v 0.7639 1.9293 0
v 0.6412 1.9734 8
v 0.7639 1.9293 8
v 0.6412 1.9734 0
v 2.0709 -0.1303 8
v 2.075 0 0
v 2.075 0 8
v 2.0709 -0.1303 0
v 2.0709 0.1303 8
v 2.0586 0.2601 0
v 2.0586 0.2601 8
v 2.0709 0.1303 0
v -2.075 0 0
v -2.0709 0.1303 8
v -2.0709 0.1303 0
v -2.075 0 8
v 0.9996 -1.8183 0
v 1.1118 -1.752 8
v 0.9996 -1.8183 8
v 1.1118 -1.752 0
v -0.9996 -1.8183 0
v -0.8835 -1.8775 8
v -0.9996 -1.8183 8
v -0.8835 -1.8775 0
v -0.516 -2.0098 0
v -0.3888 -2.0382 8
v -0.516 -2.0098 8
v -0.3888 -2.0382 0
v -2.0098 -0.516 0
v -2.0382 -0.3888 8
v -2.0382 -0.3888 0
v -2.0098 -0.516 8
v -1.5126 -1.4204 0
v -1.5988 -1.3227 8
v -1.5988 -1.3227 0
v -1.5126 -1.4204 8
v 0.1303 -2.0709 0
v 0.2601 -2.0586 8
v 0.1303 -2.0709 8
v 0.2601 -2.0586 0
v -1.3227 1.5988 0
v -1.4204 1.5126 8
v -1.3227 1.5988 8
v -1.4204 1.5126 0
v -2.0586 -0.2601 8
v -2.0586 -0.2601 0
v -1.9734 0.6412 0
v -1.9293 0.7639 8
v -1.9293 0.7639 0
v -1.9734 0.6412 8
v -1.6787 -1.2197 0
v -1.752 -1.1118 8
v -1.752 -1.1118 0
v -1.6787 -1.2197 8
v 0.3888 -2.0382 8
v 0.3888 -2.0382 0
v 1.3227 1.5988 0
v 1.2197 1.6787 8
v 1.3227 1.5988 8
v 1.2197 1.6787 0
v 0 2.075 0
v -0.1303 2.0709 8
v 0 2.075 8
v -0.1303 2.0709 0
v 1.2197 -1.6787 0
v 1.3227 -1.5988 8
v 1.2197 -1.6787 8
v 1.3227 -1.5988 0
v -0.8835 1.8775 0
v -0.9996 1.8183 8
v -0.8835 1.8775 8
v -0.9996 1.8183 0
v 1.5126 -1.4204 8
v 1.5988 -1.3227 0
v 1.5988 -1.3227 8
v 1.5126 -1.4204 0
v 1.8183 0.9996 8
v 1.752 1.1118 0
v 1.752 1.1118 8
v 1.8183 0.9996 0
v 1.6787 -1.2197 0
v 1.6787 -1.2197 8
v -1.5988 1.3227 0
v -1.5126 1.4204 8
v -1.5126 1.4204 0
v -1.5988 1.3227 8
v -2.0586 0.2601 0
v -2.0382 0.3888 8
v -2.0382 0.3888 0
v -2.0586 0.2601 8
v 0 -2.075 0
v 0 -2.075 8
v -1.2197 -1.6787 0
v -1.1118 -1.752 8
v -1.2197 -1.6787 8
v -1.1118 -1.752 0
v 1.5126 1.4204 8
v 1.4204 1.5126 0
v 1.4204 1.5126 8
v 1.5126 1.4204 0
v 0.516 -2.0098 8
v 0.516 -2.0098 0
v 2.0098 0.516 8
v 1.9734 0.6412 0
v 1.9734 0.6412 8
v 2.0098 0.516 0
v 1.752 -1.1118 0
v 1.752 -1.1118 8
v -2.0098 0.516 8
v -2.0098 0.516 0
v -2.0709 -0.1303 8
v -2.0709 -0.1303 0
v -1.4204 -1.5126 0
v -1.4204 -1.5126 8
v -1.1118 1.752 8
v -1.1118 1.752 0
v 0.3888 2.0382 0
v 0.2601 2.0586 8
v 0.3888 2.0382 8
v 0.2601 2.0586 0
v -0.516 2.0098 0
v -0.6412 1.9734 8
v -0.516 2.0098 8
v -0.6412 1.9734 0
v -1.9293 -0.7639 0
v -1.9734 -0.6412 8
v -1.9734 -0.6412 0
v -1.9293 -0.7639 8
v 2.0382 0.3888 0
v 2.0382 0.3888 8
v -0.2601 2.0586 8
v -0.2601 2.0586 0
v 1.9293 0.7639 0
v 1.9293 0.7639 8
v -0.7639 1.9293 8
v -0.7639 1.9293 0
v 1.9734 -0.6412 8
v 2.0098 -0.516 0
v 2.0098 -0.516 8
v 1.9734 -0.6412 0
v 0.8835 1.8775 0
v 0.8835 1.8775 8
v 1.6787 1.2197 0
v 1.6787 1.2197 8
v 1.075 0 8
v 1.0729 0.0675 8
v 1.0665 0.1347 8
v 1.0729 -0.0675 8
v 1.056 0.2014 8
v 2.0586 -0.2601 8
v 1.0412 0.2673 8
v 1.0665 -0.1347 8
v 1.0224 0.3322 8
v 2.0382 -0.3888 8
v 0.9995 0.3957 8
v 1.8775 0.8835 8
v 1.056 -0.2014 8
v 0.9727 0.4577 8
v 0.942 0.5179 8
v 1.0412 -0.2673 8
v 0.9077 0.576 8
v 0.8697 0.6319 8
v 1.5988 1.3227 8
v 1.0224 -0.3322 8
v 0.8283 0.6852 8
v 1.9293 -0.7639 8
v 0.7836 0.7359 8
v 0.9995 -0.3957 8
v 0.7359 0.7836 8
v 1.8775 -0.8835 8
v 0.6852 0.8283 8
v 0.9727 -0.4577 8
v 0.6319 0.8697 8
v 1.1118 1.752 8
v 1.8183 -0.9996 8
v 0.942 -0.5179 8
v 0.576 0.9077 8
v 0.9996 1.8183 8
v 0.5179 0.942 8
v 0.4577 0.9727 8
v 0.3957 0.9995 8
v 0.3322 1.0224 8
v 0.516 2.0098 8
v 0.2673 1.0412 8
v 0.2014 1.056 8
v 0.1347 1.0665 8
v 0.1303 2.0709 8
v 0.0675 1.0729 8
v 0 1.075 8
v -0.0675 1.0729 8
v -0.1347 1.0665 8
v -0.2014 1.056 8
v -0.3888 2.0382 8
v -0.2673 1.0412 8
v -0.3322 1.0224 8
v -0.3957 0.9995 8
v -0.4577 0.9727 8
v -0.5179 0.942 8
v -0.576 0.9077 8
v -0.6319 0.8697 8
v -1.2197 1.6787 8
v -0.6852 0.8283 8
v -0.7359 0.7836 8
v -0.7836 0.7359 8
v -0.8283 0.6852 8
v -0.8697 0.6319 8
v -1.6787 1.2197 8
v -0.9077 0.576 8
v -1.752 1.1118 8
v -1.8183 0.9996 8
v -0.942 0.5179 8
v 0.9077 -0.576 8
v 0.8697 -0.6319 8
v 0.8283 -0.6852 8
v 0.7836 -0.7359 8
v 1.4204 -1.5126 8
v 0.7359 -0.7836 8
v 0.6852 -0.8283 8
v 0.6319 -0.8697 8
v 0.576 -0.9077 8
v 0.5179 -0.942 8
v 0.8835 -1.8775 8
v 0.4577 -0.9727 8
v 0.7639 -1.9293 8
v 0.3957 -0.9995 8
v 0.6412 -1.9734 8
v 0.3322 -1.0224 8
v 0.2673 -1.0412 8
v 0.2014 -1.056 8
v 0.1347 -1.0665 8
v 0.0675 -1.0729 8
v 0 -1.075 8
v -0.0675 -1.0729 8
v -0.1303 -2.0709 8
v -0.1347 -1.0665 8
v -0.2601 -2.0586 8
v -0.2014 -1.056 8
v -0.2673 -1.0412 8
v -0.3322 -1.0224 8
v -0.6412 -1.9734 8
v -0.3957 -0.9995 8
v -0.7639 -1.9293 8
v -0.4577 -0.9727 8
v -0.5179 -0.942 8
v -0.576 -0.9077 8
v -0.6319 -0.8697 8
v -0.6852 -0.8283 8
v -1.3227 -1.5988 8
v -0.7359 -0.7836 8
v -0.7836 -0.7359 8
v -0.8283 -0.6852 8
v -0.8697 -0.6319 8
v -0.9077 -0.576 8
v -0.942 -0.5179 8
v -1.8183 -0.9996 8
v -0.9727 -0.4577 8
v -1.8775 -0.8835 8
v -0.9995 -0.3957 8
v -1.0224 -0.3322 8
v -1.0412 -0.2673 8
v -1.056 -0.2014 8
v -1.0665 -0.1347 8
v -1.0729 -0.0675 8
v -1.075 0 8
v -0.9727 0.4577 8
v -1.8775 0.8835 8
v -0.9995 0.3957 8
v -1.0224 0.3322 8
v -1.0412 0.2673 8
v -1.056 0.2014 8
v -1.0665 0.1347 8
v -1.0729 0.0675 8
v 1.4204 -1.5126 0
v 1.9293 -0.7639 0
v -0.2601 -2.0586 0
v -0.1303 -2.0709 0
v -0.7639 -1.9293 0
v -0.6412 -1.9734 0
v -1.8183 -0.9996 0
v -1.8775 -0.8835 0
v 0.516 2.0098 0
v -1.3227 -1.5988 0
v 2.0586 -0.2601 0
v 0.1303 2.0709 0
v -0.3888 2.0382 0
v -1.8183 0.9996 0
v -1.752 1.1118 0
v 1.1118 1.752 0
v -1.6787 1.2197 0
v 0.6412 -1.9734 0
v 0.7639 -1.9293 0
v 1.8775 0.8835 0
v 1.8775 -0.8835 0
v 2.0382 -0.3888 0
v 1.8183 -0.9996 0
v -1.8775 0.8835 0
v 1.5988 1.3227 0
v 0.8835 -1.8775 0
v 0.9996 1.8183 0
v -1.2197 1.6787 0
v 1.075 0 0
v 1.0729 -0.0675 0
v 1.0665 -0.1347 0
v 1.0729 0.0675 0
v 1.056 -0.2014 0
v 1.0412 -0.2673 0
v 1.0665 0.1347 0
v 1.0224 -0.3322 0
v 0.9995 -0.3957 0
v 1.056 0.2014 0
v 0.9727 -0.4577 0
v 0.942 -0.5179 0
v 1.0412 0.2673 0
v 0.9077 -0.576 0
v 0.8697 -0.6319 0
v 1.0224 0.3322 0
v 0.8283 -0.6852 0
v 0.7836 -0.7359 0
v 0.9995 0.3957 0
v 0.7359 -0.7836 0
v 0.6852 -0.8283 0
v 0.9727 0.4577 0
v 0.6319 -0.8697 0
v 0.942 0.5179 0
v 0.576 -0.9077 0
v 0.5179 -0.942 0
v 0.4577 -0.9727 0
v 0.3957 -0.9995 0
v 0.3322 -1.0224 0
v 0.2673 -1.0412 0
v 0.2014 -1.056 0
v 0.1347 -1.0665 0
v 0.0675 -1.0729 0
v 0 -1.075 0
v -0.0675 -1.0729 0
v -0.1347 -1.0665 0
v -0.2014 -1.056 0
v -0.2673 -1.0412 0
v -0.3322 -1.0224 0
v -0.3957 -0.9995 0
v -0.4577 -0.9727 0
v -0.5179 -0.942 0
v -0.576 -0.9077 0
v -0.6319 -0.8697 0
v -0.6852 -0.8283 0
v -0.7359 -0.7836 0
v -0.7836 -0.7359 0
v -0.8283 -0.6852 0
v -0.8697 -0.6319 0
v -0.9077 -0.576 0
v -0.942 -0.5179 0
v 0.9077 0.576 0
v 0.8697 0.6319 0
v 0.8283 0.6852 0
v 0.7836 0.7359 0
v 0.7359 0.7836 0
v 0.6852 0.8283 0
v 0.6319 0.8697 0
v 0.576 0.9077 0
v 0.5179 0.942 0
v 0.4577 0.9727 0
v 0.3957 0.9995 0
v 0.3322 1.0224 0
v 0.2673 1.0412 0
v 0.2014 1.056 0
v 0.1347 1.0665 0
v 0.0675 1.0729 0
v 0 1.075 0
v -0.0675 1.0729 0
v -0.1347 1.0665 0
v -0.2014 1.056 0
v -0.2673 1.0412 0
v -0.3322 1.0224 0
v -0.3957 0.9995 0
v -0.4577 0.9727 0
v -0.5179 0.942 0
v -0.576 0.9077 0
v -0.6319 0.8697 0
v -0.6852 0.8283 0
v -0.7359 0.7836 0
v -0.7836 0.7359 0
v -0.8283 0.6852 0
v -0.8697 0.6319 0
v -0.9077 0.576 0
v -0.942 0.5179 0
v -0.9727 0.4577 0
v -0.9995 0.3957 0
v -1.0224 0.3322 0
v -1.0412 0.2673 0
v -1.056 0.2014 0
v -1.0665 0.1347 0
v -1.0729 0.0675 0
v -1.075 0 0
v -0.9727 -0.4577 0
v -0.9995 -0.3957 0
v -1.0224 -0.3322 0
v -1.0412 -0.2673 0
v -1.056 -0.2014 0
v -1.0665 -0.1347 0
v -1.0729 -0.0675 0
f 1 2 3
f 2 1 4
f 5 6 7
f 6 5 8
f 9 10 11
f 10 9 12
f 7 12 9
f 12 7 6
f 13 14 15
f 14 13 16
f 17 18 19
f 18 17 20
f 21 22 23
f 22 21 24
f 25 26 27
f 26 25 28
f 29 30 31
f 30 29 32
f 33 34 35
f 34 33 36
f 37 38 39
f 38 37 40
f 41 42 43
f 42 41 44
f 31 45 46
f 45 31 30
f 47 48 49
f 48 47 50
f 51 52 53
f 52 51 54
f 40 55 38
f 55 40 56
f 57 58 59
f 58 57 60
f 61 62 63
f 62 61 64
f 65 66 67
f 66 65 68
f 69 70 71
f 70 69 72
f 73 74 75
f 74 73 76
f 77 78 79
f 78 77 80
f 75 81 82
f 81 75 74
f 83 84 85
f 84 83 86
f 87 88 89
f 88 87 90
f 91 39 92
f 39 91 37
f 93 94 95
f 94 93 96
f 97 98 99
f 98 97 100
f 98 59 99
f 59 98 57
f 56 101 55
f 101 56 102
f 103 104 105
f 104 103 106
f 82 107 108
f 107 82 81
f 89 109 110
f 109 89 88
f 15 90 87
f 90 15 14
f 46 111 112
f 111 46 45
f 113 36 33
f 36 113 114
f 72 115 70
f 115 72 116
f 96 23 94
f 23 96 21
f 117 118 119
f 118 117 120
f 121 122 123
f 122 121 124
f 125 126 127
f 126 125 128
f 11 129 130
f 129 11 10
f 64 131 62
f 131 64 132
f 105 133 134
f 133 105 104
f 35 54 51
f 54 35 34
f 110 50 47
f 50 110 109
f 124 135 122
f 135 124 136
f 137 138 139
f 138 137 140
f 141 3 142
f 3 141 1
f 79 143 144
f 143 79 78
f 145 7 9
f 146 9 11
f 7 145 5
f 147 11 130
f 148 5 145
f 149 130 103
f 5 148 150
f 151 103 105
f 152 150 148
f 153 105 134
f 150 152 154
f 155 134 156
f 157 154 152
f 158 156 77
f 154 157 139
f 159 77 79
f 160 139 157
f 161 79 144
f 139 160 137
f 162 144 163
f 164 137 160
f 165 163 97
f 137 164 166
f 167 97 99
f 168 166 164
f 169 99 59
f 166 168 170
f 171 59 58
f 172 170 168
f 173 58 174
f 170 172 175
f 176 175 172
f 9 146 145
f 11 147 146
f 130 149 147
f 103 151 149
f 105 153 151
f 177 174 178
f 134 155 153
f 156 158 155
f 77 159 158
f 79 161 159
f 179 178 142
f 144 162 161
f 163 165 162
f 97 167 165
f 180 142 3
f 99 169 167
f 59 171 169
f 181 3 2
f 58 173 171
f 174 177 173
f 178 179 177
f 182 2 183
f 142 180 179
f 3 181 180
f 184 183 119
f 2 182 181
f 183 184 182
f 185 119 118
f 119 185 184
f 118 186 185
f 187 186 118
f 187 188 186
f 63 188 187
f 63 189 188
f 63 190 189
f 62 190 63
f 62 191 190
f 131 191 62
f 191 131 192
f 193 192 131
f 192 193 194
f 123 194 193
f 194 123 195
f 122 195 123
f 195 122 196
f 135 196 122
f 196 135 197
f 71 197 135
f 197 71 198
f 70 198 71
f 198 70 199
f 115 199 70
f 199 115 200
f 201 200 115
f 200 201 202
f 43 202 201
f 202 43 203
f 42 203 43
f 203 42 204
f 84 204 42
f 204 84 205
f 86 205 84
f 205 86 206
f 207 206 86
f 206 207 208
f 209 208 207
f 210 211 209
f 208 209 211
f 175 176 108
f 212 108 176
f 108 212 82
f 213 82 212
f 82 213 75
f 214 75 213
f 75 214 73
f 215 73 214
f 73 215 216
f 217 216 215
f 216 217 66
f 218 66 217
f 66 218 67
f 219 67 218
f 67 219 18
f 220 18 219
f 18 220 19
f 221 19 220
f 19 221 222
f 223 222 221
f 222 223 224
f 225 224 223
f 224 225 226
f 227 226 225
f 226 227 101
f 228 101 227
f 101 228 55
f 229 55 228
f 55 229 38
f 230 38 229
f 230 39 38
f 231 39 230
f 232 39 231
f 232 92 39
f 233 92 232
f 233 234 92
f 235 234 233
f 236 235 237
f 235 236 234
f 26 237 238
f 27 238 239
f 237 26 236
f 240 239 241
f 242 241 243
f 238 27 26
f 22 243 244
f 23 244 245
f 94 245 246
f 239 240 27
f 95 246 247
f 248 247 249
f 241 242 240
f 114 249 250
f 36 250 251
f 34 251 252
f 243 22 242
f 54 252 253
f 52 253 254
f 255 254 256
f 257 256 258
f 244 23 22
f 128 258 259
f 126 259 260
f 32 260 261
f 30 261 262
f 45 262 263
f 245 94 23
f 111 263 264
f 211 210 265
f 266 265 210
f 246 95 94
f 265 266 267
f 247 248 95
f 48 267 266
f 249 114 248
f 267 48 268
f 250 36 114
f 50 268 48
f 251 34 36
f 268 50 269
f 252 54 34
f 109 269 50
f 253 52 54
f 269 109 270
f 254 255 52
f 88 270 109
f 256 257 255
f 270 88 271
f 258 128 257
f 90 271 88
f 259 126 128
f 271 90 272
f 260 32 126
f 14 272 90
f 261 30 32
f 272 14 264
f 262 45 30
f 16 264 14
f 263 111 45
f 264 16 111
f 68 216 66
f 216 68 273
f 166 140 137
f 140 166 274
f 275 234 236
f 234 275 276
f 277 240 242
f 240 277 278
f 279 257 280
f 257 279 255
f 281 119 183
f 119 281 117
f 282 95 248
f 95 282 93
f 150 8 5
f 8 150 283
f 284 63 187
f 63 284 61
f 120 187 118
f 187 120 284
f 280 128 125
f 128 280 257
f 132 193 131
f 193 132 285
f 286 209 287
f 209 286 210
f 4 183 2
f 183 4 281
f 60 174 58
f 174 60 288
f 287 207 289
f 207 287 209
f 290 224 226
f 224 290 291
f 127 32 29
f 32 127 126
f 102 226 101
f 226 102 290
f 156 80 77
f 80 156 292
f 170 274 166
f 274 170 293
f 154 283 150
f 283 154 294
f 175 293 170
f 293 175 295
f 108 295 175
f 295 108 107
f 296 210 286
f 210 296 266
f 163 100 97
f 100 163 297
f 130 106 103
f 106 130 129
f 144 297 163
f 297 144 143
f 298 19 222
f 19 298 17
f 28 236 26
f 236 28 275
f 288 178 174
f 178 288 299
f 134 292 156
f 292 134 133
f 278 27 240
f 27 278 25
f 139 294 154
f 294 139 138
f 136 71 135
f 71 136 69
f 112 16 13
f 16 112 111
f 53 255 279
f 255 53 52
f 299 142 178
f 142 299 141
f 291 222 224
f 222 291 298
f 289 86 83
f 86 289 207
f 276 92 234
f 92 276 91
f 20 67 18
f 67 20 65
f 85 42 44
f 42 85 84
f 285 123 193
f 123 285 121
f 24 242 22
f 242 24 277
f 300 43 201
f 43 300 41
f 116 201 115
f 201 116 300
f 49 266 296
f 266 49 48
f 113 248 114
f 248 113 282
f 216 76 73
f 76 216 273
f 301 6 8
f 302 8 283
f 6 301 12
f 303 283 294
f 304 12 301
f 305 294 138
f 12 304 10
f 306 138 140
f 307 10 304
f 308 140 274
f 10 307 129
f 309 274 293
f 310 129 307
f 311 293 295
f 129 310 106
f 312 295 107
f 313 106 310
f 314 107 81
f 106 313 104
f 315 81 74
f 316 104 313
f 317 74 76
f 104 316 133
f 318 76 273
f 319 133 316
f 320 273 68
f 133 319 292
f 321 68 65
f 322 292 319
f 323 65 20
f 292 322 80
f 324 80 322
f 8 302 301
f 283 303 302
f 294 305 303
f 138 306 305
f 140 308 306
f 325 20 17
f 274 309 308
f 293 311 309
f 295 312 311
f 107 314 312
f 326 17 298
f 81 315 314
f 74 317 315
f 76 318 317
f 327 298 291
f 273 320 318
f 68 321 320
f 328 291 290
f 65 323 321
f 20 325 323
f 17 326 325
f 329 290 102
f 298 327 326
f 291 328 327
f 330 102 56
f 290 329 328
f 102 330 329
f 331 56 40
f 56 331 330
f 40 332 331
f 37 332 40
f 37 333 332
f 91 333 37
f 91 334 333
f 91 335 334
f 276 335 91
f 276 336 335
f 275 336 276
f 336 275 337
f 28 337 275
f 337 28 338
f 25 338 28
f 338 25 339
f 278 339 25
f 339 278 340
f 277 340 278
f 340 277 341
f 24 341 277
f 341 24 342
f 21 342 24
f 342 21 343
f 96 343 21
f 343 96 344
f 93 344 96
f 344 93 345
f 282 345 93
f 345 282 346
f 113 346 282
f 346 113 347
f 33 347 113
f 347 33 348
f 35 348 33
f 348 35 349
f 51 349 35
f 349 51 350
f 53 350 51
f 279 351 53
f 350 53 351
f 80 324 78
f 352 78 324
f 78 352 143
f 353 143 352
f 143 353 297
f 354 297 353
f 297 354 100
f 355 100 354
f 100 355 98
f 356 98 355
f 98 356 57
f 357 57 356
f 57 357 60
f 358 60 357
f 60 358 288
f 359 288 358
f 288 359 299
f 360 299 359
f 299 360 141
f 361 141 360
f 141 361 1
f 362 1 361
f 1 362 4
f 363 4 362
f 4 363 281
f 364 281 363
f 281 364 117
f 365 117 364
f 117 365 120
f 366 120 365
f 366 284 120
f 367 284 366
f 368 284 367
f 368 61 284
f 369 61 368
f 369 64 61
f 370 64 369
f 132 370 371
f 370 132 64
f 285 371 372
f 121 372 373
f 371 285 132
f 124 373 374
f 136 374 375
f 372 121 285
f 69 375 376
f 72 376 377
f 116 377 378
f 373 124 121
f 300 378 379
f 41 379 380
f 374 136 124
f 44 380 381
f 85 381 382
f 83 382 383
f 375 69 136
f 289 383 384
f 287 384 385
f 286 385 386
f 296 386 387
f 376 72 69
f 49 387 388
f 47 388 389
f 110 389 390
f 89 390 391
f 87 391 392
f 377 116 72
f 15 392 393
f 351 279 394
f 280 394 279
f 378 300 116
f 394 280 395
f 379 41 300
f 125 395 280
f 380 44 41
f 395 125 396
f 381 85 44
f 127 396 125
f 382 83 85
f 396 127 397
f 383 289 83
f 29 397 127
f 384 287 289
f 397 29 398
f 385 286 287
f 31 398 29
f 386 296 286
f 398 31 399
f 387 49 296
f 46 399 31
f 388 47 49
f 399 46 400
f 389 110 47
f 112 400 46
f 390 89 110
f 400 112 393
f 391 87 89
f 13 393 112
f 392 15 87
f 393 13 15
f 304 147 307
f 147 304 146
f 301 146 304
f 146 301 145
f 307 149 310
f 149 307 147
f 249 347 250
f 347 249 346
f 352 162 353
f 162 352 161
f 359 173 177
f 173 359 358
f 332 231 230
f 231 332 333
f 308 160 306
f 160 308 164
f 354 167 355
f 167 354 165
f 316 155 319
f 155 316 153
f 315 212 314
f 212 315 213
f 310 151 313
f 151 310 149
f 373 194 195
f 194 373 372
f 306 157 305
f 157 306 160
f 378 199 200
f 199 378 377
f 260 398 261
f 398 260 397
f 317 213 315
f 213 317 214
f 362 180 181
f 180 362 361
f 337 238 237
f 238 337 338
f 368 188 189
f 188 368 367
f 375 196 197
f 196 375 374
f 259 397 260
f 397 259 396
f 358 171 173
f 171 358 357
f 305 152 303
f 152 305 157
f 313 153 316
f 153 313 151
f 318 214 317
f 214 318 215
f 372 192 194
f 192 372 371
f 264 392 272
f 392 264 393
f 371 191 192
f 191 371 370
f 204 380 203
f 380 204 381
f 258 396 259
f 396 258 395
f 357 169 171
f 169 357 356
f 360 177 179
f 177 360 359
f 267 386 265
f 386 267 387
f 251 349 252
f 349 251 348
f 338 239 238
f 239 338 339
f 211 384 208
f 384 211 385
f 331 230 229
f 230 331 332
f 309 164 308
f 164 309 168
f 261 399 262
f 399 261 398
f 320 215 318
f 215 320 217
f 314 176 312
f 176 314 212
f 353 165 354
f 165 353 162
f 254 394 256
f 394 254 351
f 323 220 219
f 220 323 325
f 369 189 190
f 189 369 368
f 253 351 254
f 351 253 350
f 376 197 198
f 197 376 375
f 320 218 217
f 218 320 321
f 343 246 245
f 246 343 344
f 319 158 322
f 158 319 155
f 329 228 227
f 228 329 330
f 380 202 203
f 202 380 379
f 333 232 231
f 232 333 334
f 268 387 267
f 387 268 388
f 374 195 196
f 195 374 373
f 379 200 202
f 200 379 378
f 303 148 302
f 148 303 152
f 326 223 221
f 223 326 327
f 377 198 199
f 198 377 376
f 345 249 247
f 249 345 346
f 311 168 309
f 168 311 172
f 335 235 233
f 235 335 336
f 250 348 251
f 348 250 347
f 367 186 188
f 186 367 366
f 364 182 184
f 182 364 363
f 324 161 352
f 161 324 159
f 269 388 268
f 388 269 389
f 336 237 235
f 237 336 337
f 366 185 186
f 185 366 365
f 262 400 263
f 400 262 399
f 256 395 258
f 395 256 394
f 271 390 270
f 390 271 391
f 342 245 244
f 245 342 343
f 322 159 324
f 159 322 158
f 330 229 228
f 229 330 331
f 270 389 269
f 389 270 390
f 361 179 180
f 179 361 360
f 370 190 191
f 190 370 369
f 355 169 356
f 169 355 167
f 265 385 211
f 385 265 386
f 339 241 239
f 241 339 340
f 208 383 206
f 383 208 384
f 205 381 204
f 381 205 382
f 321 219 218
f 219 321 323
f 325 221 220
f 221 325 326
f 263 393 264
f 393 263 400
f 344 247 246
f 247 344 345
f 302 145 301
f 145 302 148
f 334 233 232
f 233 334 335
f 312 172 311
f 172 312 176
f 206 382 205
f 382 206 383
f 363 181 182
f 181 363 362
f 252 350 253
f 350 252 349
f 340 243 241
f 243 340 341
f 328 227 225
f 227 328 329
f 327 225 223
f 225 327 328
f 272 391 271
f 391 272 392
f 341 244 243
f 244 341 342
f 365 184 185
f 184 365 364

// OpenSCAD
$fn=100;

adapter_height = 8;
adapter_width = 4.15;
pin = 2.15;

difference() {
    cylinder(h=adapter_height, r=adapter_width/2);
    translate([0,0,-1]) cylinder(h=adapter_height+2, r=pin/2);
}
